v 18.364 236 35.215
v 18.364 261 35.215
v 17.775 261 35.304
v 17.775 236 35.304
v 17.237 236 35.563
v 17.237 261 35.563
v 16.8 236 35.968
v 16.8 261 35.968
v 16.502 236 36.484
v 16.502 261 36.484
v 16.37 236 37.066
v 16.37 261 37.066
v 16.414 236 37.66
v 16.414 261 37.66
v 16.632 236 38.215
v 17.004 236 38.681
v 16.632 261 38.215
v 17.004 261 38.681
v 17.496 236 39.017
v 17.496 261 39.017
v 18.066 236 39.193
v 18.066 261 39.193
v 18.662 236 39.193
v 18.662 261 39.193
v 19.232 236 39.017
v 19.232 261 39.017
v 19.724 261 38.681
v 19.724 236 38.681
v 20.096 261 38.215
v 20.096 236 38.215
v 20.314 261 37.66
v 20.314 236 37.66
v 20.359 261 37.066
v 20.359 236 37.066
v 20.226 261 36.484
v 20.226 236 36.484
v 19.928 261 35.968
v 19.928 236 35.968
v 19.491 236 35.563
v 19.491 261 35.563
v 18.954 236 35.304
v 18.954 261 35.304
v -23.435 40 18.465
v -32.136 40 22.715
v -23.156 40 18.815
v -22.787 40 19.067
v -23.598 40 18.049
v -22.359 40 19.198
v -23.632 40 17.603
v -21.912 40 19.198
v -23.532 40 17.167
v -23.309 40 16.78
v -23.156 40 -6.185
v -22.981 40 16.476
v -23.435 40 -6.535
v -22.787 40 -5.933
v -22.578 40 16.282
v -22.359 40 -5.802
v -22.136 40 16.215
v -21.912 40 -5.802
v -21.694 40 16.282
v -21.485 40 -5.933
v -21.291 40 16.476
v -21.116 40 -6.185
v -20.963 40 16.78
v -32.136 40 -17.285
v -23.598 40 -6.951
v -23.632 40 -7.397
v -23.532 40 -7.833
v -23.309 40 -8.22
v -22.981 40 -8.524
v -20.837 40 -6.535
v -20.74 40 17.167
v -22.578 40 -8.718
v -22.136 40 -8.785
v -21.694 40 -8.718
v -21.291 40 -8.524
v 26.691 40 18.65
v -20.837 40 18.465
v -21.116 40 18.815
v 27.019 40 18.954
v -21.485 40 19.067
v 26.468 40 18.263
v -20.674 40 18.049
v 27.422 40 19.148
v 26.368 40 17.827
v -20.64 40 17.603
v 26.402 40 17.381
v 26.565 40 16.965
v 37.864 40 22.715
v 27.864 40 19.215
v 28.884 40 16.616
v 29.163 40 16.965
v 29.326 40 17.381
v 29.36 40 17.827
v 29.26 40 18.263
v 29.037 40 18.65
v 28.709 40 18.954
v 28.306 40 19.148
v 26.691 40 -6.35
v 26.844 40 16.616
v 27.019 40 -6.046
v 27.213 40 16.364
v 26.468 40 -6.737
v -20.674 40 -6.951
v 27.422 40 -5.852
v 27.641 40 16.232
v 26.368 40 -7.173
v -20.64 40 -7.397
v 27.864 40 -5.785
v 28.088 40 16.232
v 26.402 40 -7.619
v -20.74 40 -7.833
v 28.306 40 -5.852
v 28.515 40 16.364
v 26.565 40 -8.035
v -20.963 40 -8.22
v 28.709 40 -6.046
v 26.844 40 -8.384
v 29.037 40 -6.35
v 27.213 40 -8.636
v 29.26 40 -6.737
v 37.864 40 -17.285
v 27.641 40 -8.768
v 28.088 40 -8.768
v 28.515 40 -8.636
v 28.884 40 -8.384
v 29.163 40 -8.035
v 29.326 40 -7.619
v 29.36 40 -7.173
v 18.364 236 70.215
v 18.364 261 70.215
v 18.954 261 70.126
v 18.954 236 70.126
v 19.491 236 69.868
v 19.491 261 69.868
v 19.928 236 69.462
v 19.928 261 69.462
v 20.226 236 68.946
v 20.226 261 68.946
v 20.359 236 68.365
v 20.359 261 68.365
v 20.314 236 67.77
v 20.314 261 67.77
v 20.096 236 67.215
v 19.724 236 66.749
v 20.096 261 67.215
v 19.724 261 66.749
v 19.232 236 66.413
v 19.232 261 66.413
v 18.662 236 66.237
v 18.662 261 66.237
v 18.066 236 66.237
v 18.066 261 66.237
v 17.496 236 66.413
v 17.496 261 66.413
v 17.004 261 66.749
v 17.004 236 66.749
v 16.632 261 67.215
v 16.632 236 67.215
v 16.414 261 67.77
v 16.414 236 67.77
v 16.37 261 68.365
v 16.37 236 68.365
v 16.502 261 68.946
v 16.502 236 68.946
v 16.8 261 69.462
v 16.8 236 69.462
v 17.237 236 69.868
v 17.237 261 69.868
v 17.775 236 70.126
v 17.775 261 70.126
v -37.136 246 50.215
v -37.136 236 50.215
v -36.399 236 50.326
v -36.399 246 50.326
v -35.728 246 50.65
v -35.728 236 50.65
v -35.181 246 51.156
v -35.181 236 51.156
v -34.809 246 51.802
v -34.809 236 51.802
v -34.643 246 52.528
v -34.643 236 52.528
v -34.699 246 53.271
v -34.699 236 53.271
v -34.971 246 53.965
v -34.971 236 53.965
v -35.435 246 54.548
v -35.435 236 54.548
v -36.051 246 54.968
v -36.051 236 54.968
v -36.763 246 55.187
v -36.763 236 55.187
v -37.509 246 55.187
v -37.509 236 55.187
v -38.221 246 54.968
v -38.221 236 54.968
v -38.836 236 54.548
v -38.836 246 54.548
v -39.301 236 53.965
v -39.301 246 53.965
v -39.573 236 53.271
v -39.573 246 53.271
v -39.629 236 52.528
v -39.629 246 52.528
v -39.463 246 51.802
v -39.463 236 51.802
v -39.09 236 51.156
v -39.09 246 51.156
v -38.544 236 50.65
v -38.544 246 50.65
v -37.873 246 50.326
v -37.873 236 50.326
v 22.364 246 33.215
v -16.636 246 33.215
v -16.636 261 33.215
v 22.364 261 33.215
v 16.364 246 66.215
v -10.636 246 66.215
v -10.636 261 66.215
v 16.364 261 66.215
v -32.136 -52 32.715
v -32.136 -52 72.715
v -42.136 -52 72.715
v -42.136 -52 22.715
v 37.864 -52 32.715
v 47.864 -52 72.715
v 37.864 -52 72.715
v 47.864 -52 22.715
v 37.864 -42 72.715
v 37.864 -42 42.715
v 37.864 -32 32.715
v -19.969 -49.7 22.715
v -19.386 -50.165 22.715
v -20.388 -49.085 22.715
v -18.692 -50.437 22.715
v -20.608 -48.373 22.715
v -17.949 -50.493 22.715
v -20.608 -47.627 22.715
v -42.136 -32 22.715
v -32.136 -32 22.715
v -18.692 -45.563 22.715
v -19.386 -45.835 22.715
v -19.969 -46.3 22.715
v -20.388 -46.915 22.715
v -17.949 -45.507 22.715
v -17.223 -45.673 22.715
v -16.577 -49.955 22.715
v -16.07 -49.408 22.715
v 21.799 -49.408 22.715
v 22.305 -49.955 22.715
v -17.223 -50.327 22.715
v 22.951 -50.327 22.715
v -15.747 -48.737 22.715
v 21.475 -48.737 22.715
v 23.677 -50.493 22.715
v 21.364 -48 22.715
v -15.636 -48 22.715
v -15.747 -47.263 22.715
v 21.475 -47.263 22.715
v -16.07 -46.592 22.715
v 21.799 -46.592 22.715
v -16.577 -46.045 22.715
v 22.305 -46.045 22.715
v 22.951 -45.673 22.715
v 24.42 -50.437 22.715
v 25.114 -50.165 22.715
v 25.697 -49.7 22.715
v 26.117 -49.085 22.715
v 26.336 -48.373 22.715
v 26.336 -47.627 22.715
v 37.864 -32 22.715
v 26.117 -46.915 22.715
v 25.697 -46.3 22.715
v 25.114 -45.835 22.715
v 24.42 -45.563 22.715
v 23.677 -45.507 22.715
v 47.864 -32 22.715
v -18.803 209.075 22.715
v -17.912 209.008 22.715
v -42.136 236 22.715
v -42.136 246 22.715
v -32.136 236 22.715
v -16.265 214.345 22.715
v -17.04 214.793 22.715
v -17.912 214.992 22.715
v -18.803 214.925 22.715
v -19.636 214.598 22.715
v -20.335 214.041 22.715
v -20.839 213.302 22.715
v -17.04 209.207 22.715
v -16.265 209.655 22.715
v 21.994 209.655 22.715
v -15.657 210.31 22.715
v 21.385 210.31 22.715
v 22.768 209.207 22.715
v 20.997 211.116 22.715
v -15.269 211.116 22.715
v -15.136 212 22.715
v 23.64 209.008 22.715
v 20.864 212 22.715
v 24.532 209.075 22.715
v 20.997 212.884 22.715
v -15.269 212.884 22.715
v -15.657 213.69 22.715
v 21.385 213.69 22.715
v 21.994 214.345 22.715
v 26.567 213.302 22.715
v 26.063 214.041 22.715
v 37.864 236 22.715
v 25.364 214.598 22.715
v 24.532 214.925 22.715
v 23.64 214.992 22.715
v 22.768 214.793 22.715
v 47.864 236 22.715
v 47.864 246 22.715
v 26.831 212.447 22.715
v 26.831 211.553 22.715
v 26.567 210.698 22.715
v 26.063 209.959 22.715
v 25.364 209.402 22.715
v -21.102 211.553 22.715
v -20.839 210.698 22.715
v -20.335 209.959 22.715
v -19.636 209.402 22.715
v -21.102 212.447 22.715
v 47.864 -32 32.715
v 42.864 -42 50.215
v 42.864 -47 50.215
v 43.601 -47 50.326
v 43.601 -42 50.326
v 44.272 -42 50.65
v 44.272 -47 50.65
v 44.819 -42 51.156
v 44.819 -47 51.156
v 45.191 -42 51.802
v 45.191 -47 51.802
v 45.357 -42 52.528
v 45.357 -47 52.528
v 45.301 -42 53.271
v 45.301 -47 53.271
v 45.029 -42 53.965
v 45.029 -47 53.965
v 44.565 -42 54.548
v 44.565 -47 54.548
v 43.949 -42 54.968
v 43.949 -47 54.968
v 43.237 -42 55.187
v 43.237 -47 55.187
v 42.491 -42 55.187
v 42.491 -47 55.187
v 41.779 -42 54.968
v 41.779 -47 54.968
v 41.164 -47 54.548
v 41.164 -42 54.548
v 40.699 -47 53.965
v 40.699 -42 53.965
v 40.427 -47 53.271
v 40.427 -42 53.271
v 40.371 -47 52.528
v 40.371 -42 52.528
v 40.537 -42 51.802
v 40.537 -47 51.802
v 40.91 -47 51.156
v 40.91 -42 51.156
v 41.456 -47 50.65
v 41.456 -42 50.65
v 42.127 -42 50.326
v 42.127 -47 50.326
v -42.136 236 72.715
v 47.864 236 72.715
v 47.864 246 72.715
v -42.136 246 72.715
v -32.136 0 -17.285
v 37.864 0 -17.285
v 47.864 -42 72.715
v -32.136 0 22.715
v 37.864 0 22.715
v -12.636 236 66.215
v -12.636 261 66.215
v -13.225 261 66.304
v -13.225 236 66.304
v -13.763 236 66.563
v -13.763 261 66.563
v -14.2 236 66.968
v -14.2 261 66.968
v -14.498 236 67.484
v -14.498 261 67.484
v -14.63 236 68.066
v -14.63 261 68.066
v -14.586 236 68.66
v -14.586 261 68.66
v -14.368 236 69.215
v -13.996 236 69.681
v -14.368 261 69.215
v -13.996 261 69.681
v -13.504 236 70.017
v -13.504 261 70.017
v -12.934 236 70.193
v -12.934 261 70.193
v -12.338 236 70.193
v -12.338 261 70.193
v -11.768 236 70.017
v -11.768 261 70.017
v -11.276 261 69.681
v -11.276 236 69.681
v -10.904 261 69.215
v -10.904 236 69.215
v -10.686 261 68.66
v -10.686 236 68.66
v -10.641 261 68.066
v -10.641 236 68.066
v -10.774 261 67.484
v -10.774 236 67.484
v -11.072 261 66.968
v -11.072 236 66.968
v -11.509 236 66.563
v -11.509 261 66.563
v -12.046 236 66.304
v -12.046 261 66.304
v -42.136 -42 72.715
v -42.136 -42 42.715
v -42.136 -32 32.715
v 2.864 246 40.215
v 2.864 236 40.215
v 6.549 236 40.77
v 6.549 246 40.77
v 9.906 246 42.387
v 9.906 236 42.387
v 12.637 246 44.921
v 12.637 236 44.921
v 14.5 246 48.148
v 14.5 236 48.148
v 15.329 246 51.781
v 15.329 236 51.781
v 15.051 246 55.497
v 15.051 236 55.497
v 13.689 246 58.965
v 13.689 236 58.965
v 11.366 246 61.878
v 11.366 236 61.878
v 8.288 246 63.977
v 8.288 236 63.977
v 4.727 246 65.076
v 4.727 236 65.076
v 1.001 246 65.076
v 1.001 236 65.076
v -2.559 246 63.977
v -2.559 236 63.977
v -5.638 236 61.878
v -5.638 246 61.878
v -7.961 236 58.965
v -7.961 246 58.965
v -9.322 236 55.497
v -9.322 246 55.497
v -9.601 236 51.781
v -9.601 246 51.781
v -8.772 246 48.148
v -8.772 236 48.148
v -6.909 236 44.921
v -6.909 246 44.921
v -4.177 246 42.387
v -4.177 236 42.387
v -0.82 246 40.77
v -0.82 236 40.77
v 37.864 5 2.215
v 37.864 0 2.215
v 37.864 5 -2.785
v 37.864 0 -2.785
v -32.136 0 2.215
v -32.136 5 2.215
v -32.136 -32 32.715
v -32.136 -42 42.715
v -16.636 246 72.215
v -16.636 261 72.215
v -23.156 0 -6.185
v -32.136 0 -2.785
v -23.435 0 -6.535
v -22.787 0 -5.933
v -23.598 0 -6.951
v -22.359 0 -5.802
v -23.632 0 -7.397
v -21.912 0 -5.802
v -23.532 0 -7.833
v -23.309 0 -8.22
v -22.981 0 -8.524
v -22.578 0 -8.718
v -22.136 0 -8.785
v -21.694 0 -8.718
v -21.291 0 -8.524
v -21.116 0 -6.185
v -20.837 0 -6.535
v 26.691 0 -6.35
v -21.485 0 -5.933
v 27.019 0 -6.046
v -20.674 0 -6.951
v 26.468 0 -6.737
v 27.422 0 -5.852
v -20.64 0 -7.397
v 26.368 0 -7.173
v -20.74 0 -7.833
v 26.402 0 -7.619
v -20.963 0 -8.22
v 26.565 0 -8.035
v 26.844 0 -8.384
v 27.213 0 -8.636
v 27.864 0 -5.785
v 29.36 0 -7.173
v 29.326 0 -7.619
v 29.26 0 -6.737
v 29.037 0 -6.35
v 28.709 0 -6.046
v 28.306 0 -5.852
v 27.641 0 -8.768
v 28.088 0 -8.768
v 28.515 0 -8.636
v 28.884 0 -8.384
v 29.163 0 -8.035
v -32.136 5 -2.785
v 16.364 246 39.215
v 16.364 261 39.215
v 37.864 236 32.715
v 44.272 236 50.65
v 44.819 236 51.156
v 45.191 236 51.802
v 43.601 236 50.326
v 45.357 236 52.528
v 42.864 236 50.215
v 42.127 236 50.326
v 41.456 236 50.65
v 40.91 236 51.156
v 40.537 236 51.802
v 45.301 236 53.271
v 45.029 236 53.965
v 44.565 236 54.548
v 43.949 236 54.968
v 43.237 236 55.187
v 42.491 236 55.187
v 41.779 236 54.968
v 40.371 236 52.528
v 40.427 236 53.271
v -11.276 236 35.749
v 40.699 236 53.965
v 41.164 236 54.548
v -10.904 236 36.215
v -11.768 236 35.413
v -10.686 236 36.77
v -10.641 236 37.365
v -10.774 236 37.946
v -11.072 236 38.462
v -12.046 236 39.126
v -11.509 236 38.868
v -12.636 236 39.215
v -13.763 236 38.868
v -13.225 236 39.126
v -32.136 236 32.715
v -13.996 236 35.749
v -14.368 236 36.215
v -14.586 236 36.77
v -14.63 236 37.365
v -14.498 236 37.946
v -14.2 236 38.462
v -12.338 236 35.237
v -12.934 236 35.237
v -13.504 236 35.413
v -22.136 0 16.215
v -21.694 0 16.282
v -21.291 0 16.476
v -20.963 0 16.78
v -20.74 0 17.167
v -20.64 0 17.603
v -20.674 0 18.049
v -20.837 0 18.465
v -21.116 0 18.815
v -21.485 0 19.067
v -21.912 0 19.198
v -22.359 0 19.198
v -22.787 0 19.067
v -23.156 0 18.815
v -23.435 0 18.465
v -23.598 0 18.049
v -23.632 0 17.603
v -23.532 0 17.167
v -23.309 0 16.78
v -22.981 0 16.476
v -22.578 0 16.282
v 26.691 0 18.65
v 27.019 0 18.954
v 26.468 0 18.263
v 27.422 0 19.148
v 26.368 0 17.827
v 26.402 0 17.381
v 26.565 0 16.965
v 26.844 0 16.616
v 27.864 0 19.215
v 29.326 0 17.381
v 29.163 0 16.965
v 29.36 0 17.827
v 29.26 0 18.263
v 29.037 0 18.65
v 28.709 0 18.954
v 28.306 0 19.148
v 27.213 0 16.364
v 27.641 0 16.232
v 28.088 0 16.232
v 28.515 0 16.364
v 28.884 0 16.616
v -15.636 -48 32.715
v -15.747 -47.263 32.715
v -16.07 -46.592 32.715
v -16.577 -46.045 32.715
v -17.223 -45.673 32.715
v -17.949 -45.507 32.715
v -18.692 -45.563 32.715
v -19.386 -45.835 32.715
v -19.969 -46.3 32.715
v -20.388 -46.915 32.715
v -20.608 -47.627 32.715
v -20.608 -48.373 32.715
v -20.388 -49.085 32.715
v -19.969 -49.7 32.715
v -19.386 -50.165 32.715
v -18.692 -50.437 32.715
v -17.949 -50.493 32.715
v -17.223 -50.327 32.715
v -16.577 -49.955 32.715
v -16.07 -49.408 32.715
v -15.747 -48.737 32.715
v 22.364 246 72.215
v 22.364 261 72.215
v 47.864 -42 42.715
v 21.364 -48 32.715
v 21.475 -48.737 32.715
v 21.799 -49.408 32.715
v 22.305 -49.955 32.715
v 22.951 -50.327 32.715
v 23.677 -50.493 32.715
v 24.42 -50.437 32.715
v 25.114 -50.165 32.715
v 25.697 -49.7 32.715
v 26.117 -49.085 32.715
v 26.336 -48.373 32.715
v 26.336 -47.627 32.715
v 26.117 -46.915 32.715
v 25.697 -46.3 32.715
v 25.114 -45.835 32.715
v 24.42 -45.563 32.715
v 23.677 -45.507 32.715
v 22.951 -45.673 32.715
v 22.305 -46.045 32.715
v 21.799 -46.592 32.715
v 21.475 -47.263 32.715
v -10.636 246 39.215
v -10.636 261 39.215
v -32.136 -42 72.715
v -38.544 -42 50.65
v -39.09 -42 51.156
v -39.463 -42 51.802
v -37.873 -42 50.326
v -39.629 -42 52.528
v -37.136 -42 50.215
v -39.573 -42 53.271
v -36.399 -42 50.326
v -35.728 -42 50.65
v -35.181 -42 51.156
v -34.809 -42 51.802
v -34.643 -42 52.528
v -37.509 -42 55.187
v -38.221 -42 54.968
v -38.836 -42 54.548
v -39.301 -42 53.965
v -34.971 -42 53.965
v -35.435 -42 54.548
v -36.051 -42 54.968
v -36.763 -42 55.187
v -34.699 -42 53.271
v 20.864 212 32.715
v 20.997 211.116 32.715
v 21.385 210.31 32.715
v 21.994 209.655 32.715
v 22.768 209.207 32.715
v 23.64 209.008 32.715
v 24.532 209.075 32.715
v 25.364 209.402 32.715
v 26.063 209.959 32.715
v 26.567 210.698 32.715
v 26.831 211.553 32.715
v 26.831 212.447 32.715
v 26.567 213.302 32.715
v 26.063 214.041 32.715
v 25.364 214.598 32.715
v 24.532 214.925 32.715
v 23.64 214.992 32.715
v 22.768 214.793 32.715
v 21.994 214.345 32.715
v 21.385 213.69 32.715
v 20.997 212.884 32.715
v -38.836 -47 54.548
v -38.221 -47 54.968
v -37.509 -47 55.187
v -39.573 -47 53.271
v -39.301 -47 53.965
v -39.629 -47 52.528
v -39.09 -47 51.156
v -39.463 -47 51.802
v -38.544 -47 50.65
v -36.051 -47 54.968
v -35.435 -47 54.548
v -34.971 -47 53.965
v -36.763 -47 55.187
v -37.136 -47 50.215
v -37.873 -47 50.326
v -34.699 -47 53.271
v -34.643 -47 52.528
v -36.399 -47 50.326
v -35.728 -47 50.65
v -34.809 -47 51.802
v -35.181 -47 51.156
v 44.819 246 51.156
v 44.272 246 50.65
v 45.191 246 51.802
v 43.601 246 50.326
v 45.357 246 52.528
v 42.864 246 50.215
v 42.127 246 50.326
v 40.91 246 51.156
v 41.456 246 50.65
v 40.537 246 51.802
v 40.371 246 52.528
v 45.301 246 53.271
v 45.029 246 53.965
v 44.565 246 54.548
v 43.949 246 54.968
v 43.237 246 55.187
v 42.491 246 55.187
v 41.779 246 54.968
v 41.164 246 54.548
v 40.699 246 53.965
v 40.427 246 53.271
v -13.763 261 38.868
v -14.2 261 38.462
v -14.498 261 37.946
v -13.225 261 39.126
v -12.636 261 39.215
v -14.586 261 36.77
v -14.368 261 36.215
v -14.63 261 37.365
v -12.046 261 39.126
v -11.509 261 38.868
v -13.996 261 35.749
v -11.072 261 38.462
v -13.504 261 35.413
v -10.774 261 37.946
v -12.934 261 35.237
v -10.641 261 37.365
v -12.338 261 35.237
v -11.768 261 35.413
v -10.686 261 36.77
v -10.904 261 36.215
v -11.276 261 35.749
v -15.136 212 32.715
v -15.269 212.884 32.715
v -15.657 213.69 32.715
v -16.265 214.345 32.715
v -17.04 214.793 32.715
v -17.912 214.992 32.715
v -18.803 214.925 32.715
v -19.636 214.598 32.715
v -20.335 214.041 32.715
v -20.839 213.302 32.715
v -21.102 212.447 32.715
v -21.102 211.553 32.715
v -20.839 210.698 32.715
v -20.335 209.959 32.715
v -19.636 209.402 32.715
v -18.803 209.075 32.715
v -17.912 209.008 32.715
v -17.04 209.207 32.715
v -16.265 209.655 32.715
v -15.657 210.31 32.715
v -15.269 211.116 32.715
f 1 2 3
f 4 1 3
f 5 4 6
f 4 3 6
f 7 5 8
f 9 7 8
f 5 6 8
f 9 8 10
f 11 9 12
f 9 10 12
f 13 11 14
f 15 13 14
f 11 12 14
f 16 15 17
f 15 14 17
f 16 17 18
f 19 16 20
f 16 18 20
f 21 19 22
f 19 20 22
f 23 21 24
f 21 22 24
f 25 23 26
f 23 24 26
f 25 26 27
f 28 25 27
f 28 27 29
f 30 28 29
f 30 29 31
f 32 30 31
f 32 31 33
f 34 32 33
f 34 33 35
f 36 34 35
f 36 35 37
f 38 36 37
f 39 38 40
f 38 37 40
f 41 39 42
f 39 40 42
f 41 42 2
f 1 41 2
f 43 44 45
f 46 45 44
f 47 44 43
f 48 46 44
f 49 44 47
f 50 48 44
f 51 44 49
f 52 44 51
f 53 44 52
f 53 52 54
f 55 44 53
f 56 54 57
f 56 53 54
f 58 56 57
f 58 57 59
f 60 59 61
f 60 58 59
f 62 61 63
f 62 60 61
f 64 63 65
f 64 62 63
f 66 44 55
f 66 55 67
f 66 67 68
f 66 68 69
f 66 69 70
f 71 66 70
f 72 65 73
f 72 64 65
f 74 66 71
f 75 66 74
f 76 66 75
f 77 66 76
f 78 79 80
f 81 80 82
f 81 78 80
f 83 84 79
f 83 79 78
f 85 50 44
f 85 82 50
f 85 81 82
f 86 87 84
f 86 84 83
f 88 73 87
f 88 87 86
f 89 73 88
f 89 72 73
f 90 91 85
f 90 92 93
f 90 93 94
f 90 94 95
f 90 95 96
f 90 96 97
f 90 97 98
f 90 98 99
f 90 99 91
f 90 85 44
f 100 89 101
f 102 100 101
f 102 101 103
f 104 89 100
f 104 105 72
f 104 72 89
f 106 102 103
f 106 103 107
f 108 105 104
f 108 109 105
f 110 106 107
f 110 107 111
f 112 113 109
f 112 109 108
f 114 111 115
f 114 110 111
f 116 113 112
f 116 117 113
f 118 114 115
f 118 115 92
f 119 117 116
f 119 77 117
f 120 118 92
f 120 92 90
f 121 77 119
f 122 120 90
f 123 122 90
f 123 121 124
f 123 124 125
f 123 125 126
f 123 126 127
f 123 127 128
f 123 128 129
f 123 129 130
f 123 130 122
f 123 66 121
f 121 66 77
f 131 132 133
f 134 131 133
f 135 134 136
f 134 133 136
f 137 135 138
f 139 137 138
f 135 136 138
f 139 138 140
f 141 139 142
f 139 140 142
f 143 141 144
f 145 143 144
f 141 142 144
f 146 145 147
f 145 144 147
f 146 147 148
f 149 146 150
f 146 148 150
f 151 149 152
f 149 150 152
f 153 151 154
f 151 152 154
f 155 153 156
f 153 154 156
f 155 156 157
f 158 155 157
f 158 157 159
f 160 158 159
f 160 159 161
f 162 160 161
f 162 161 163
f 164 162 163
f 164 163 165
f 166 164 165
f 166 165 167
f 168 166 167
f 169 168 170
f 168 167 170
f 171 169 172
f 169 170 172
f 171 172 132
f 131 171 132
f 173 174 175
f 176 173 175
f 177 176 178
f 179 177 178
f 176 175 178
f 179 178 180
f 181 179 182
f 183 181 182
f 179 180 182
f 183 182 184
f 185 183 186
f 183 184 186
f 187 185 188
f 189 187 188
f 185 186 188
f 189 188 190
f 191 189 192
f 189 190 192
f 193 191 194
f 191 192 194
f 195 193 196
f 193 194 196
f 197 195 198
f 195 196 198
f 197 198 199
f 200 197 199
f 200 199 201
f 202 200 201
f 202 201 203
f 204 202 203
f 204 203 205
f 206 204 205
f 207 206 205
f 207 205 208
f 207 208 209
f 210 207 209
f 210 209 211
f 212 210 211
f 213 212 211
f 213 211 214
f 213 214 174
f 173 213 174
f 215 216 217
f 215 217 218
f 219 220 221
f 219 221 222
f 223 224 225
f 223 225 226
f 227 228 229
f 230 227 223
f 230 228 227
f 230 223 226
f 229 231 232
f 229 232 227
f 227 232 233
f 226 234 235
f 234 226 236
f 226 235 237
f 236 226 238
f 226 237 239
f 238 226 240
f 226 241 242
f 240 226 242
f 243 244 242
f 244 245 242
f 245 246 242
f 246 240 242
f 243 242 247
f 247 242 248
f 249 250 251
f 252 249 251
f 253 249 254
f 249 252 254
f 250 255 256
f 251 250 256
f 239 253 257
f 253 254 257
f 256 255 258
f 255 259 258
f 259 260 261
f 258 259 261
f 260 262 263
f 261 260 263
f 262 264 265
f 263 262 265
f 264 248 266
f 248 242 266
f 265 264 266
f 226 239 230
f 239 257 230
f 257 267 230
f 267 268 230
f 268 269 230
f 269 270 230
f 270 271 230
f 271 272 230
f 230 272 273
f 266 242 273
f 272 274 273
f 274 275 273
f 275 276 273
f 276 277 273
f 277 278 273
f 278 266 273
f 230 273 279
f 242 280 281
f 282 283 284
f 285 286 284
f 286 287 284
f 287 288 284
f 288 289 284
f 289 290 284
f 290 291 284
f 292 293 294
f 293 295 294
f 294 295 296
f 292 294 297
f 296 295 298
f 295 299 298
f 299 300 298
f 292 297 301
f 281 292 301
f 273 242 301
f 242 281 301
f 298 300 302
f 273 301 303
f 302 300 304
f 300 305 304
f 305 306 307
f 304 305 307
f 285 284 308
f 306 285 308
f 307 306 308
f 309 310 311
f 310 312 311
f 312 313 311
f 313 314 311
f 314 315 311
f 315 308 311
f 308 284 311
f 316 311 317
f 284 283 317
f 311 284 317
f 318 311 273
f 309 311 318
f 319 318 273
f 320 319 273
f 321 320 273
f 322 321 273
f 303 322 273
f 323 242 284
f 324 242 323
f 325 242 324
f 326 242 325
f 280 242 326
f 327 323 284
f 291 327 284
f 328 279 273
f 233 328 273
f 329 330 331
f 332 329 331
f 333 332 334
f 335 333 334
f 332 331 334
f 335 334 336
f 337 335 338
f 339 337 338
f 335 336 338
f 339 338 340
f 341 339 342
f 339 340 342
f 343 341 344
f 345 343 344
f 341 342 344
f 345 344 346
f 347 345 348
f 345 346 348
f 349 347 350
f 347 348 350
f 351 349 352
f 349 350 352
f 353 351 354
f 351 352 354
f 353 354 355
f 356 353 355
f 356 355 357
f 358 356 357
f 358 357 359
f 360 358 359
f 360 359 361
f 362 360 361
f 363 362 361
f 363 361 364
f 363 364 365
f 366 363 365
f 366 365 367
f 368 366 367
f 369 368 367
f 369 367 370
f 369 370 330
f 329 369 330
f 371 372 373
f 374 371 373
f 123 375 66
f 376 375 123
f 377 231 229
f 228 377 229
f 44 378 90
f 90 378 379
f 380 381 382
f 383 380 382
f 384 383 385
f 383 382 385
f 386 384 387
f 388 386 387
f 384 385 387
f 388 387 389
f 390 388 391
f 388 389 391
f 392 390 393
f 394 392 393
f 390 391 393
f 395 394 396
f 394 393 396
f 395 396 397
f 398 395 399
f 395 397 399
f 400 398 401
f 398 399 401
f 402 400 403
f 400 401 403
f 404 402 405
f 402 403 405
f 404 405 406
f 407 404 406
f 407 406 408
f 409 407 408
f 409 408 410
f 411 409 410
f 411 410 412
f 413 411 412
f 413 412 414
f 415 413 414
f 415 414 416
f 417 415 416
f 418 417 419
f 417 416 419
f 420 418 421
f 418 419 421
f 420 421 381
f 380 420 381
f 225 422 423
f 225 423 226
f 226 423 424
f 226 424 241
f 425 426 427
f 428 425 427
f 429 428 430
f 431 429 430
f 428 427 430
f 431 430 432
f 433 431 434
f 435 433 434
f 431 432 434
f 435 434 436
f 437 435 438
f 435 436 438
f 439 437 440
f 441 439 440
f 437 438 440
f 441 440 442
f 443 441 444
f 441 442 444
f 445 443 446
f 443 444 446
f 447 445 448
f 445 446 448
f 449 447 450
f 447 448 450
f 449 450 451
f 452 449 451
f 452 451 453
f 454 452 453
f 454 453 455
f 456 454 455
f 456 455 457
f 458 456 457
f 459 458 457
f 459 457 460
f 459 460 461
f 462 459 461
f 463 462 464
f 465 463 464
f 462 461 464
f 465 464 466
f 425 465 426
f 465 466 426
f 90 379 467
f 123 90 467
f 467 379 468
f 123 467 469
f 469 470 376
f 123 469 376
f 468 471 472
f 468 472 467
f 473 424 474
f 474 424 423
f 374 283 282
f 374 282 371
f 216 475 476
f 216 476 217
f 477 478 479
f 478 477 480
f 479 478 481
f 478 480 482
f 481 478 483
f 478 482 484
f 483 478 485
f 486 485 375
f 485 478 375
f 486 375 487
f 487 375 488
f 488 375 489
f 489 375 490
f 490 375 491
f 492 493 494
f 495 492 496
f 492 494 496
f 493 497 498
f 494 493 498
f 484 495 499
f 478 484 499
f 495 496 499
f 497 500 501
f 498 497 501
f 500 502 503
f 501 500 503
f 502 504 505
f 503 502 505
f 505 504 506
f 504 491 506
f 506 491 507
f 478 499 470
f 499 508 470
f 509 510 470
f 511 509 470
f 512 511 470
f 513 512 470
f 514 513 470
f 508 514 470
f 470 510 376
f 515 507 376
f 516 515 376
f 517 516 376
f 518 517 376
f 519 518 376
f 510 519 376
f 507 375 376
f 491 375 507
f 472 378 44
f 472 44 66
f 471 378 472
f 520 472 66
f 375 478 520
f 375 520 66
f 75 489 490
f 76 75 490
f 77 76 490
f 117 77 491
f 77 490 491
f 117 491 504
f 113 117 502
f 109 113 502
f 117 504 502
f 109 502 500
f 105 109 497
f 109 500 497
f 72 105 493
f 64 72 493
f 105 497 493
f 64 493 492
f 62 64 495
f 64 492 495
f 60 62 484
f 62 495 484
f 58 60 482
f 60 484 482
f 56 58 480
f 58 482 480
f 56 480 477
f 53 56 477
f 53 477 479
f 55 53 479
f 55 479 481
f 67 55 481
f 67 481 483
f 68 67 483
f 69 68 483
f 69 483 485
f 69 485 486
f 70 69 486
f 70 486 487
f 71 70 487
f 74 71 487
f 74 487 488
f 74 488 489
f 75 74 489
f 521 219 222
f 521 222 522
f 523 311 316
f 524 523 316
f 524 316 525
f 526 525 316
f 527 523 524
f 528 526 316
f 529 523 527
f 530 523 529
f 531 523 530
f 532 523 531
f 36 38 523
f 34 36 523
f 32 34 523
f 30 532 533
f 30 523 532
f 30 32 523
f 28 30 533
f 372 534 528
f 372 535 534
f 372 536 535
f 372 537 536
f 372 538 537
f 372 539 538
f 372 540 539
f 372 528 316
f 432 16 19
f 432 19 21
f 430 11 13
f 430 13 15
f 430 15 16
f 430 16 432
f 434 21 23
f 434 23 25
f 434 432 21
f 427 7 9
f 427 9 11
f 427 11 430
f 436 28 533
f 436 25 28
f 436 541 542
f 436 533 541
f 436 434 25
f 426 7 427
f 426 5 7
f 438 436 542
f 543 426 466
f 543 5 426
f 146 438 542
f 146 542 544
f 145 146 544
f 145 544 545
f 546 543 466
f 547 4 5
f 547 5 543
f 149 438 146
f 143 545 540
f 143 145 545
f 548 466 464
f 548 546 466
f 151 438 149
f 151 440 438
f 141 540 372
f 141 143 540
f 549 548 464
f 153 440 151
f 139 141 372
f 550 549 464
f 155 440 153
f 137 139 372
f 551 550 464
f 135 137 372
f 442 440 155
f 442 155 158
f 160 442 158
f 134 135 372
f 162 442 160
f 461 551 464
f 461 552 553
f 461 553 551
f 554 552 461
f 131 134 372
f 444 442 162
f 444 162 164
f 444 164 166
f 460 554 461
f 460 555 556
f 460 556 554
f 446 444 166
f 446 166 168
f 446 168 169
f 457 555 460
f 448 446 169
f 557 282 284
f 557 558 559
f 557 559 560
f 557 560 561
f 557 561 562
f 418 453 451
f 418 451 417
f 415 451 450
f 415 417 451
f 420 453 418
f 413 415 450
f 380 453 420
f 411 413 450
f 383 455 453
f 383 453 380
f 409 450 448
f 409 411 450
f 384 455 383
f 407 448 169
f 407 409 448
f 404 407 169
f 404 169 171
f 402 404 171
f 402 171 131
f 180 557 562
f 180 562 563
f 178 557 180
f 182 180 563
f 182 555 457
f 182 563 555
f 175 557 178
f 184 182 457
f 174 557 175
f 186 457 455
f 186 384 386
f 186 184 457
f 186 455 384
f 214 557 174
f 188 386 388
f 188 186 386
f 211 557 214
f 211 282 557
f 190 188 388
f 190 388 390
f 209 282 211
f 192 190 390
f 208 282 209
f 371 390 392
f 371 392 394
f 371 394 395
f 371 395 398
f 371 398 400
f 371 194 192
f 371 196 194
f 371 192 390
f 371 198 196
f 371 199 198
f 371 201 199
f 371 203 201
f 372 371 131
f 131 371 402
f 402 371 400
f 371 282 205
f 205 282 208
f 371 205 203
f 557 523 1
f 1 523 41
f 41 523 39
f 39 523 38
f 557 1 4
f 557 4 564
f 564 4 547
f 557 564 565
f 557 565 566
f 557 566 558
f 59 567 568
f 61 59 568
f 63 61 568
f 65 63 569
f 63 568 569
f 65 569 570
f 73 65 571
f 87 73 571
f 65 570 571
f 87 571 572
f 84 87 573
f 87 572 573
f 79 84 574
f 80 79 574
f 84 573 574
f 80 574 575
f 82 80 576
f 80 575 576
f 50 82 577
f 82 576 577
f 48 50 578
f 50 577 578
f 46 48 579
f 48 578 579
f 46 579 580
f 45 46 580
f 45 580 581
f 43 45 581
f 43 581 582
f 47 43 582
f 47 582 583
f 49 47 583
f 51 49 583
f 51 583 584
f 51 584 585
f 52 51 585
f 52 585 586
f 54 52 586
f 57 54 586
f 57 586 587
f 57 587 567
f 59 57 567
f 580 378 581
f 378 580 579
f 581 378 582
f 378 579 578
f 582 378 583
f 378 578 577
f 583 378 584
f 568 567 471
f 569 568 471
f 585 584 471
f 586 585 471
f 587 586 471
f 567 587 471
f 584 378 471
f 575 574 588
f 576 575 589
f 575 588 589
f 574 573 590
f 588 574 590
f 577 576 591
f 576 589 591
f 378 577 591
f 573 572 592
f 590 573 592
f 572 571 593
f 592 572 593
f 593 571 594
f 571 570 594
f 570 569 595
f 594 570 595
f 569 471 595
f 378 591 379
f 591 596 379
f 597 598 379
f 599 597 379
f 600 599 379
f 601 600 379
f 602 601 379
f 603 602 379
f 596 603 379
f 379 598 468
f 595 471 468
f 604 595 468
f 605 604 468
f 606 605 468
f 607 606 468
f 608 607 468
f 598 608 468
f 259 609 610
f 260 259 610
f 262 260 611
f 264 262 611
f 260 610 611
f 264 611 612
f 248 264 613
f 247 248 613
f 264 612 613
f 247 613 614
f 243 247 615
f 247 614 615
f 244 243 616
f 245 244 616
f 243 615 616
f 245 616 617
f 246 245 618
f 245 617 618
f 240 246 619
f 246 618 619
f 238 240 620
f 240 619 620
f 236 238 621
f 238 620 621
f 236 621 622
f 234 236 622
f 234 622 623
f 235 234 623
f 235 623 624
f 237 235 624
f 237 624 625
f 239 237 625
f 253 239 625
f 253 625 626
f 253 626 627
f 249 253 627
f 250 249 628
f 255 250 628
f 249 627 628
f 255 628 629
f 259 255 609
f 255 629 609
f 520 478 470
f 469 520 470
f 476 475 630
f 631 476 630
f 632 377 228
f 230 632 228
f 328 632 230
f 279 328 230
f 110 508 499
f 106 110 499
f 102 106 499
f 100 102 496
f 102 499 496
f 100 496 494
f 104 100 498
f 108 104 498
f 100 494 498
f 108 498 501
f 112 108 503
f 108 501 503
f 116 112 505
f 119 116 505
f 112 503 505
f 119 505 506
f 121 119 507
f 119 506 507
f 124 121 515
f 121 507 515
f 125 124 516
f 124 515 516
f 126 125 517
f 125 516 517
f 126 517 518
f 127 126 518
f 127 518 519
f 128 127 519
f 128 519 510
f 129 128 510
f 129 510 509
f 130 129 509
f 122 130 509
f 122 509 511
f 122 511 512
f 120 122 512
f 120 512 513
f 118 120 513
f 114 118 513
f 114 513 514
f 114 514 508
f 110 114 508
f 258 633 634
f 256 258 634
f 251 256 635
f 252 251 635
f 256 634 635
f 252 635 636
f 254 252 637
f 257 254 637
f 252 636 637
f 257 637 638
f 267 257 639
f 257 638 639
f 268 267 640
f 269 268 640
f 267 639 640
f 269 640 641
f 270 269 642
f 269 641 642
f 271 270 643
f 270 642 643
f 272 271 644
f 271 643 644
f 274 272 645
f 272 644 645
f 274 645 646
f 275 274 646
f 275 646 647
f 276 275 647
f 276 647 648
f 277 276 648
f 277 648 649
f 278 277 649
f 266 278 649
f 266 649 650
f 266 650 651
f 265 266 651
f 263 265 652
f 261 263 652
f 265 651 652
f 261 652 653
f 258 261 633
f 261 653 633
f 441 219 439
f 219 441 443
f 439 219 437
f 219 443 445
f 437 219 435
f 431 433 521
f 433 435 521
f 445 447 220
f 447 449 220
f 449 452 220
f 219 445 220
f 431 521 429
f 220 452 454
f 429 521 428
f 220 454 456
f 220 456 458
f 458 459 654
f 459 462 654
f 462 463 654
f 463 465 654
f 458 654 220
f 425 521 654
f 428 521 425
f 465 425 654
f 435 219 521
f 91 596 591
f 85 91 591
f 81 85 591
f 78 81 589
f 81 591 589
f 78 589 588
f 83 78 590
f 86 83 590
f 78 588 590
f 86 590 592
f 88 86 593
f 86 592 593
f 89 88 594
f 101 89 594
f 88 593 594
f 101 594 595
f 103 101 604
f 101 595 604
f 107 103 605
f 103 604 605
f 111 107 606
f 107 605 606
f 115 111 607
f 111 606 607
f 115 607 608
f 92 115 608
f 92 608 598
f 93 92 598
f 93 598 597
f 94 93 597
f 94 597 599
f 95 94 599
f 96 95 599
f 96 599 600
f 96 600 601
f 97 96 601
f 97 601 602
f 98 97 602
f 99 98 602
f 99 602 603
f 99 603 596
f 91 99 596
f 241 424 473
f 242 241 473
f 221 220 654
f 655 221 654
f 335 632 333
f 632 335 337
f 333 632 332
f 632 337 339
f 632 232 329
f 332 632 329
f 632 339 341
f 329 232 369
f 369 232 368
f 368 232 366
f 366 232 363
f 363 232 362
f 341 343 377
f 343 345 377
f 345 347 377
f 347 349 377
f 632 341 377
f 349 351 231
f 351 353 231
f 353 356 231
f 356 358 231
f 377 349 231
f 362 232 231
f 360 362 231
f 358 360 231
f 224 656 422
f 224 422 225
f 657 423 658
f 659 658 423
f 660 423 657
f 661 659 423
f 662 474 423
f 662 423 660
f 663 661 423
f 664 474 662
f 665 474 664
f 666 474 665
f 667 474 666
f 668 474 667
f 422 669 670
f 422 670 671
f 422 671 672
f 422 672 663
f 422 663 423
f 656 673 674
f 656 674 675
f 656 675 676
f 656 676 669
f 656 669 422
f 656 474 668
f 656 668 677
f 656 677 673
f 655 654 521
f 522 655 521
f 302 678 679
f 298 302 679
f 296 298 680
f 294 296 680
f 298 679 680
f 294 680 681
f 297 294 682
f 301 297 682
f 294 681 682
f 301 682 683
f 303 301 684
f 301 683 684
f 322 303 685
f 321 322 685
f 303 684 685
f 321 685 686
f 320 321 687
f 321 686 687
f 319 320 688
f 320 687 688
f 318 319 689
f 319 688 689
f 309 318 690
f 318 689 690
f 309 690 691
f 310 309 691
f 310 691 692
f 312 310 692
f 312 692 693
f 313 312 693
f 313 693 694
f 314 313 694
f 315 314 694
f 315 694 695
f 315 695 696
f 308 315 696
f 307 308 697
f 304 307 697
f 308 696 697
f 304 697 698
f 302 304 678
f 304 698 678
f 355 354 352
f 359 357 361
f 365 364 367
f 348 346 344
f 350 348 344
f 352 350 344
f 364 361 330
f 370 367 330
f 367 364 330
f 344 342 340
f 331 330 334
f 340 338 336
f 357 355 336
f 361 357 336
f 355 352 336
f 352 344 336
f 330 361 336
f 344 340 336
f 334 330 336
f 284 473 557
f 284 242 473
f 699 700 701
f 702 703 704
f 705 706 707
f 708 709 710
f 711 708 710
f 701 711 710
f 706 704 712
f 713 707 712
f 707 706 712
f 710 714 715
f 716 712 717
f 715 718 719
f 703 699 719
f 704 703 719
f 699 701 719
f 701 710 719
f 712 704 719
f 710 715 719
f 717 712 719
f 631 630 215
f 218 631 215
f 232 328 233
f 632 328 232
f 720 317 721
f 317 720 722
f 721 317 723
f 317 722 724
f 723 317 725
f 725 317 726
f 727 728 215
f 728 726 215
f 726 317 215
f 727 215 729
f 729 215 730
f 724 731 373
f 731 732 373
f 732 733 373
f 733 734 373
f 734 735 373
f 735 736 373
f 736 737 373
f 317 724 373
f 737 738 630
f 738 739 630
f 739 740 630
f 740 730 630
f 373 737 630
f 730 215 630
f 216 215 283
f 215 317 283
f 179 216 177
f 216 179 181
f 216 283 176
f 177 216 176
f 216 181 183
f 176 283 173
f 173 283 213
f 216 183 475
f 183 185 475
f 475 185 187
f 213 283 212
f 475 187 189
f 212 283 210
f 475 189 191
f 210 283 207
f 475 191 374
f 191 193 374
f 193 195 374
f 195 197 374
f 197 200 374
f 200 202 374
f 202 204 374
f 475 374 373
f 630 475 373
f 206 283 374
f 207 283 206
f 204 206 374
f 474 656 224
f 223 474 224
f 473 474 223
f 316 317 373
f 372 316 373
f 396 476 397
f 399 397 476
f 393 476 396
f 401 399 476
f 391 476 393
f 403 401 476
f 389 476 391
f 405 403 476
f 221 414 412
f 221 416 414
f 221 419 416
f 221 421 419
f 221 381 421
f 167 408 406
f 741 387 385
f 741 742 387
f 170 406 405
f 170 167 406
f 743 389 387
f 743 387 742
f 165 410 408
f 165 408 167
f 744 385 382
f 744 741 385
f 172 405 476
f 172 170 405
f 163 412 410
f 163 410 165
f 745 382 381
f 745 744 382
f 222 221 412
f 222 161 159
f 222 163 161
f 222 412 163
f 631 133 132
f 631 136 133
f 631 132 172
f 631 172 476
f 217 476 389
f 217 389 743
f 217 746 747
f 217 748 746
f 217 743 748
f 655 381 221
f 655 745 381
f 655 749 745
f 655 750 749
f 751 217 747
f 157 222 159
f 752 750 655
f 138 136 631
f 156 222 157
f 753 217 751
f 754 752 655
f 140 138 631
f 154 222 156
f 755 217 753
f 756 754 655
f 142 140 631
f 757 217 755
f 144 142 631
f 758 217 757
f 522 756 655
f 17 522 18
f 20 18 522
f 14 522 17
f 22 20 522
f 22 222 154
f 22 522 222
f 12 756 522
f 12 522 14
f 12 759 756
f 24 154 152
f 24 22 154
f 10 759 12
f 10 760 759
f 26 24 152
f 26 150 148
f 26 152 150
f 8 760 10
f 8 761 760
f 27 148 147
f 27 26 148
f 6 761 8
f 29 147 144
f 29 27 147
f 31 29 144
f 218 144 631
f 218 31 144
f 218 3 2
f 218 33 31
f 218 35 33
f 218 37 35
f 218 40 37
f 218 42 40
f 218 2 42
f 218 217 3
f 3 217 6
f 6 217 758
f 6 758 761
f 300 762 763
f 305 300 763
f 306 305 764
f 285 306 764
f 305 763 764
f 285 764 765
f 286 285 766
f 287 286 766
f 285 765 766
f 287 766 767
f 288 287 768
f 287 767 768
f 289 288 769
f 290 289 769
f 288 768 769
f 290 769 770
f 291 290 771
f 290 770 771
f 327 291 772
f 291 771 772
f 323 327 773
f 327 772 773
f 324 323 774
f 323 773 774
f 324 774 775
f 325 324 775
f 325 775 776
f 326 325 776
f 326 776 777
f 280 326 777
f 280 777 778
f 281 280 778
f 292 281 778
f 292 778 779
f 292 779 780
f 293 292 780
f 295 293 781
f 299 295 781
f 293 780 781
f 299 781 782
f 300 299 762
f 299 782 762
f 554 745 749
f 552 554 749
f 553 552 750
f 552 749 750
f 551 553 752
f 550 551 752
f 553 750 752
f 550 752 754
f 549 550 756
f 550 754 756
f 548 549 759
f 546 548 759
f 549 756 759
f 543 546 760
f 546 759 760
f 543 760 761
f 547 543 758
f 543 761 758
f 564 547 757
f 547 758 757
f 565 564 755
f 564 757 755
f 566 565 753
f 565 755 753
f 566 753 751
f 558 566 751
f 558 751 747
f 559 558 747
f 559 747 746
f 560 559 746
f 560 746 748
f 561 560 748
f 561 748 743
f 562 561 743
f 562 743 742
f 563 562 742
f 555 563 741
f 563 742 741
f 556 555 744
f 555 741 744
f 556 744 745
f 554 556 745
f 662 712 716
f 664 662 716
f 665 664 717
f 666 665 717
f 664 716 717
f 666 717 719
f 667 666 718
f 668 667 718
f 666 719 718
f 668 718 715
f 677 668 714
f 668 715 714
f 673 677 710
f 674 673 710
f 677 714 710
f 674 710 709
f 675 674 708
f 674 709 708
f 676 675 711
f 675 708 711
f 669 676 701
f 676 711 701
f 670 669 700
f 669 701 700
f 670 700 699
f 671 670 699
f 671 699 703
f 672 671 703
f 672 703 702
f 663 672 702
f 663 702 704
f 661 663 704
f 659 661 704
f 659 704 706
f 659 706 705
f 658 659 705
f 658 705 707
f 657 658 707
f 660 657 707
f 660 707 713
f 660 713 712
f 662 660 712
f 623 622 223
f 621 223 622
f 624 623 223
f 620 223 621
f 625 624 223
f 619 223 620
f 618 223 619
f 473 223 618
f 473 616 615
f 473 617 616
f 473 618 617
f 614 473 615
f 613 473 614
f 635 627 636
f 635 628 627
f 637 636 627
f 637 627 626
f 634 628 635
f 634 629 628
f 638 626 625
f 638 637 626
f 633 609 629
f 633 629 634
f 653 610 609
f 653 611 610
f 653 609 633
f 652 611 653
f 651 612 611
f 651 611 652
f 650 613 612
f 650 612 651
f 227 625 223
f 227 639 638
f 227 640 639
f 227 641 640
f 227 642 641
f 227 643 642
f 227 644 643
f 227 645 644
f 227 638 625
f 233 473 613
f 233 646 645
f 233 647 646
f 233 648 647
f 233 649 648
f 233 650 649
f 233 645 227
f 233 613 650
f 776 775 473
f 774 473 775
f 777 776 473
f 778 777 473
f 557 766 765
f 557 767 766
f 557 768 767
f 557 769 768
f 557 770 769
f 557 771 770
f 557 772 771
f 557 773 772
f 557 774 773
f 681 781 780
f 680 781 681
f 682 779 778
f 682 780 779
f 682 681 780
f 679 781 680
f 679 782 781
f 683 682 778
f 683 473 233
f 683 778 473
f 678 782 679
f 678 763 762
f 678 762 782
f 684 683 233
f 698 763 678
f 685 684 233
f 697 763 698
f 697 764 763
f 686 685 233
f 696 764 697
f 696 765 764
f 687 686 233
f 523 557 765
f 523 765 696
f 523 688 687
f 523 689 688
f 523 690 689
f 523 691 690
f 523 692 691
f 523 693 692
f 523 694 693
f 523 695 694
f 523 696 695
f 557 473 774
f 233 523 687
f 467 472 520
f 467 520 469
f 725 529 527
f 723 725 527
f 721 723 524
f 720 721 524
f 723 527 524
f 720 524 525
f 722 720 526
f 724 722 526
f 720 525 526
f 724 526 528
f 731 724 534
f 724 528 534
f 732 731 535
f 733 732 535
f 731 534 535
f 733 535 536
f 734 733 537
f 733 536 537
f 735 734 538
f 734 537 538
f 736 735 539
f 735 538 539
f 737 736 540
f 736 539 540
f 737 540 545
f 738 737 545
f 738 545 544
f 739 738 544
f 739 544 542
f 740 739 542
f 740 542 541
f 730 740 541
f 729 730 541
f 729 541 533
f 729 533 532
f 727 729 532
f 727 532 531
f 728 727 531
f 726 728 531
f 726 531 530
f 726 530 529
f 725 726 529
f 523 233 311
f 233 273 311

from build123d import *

# Parameters (mm, degrees)
SKETCH_1_W               = 70
SKETCH_1_H               = 40
EXTRUDE_1_DEPTH          = 40
SKETCH_2_R               = 1.5
CUT_EXTRUDE_1_DEPTH      = 60.579081363
EXTRUDE_2_DEPTH          = 52
EXTRUDE_2_DEPTH_BACK     = 236
SKETCH_4_W               = 70
SKETCH_4_H               = 10
SKETCH_5_R               = 2.5
CUT_EXTRUDE_2_DEPTH      = 10
SKETCH_6_R               = 3
CUT_EXTRUDE_3_DEPTH      = 10
SKETCH_7_W               = 70
SKETCH_7_H               = 10
EXTRUDE_3_DEPTH          = 50
SKETCH_8_R               = 12.5
CUT_EXTRUDE_4_DEPTH      = 10
SKETCH_12_W              = 39
SKETCH_12_H              = 39
SKETCH_12_W_2            = 27
SKETCH_12_H_2            = 27
EXTRUDE_2_2_DEPTH        = 15
SKETCH_14_R              = 2
CUT_EXTRUDE_5_DEPTH      = 25
SKETCH_15_W              = 70
SKETCH_15_H              = 5
CUT_EXTRUDE_6_DEPTH      = 5
SKETCH_16_W              = 50
SKETCH_16_H              = 10
EXTRUDE_5_DEPTH          = 10
MIRROR_2_COPY_1_SKETCH_W = 50
MIRROR_2_COPY_1_SKETCH_H = 10
MIRROR_2_COPY_1_DEPTH    = 10
SKETCH_17_R              = 2.5
CUT_EXTRUDE_7_DEPTH      = 325.880687163
SKETCH_18_R              = 2.5
EXTRUDE_6_DEPTH          = 5
SKETCH_21_W              = 10
SKETCH_21_H              = 10
EXTRUDE_8_DEPTH          = 10
EXTRUDE_9_DEPTH          = 10
EXTRUDE_10_DEPTH         = 10


with BuildPart() as part:
    # 草图1 → 凸台-拉伸1 (new body)
    with BuildSketch(Plane(origin=(0, 0, 0), x_dir=(1, 0, 0), z_dir=(0, 1, 0))):
        with Locations((2.864103165, -2.71511892)):
            Rectangle(SKETCH_1_W, SKETCH_1_H)
    extrude(amount=EXTRUDE_1_DEPTH)

    # 草图2 → 切除-拉伸1 (cut, through all)
    with BuildSketch(Plane.XZ):
        with Locations(Location((-22.135896835, 17.71511892, 0), (0, 0, 270))):
            Circle(SKETCH_2_R)
        with Locations(Location((27.864103165, 17.71511892, 0), (0, 0, 90))):
            Circle(SKETCH_2_R)
        with Locations(Location((-22.135896835, -7.28488108, 0), (0, 0, 270))):
            Circle(SKETCH_2_R)
        with Locations(Location((27.864103165, -7.28488108, 0), (0, 0, 90))):
            Circle(SKETCH_2_R)
    extrude(amount=-CUT_EXTRUDE_1_DEPTH, mode=Mode.SUBTRACT)

    # 草图15 → 切除-拉伸6 (cut)
    with BuildSketch(Plane.XZ):
        with Locations((2.864103165, -0.28488108)):
            Rectangle(SKETCH_15_W, SKETCH_15_H)
    extrude(amount=-CUT_EXTRUDE_6_DEPTH, mode=Mode.SUBTRACT)


with BuildPart() as body_2:
    # 草图4 → Extrude 2 (new, two sides: drawn at the far end of the back side and taken through both)
    with BuildSketch(Plane.XZ.offset(-EXTRUDE_2_DEPTH_BACK)):
        with Locations((2.864103165, 27.71511892)):
            Rectangle(SKETCH_4_W, SKETCH_4_H)
    extrude(amount=EXTRUDE_2_DEPTH + EXTRUDE_2_DEPTH_BACK)

    # 草图5 → 切除-拉伸2 (cut)
    with BuildSketch(Plane.XY.offset(32.71511892)):
        with Locations((-18.135896835, -48)):
            Circle(SKETCH_5_R)
        with Locations(Location((23.864103165, -48, 0), (0, 0, 180))):
            Circle(SKETCH_5_R)
    extrude(amount=-CUT_EXTRUDE_2_DEPTH, mode=Mode.SUBTRACT)

    # 草图6 → 切除-拉伸3 (cut)
    with BuildSketch(Plane.XY.offset(32.71511892)):
        with Locations((-18.135896835, 212)):
            Circle(SKETCH_6_R)
        with Locations(Location((23.864103165, 212, 0), (0, 0, 180))):
            Circle(SKETCH_6_R)
    extrude(amount=-CUT_EXTRUDE_3_DEPTH, mode=Mode.SUBTRACT)

    # 草图7 → 凸台-拉伸3 (add)
    with BuildSketch(Plane(origin=(0, 0, 22.71511892), x_dir=(-1, 0, 0), z_dir=(0, 0, -1))):
        with Locations((-2.864103165, 241)):
            Rectangle(SKETCH_7_W, SKETCH_7_H)
    extrude(amount=-EXTRUDE_3_DEPTH)

    # 草图8 → 切除-拉伸4 (cut)
    with BuildSketch(Plane.XZ.offset(-236)):
        with Locations(Location((2.864103165, 52.71511892, 0), (0, 0, 270))):
            Circle(SKETCH_8_R)
    extrude(amount=-CUT_EXTRUDE_4_DEPTH, mode=Mode.SUBTRACT)

    # 草图12 → Extrude 2 2 (add)
    with BuildSketch(Plane(origin=(0, 246, 0), x_dir=(1, 0, 0), z_dir=(0, 1, 0))):
        with Locations((2.864103165, -52.71511892)):
            Rectangle(SKETCH_12_W, SKETCH_12_H)
        with Locations((2.864103165, -52.71511892)):
            Rectangle(SKETCH_12_W_2, SKETCH_12_H_2, mode=Mode.SUBTRACT)
    extrude(amount=EXTRUDE_2_2_DEPTH)

    # 草图14 → 切除-拉伸5 (cut)
    with BuildSketch(Plane(origin=(0, 261, 0), x_dir=(1, 0, 0), z_dir=(0, 1, 0))):
        with Locations(Location((-12.635896835, -37.21511892, 0), (0, 0, 270))):
            Circle(SKETCH_14_R)
        with Locations(Location((18.364103165, -37.21511892, 0), (0, 0, 90))):
            Circle(SKETCH_14_R)
        with Locations(Location((-12.635896835, -68.21511892, 0), (0, 0, 90))):
            Circle(SKETCH_14_R)
        with Locations(Location((18.364103165, -68.21511892, 0), (0, 0, 270))):
            Circle(SKETCH_14_R)
    extrude(amount=-CUT_EXTRUDE_5_DEPTH, mode=Mode.SUBTRACT)

    # 草图16 → 凸台-拉伸5 (add)
    with BuildSketch(Plane.ZY.offset(32.135896835)):
        with Locations((47.71511892, 241)):
            Rectangle(SKETCH_16_W, SKETCH_16_H)
    extrude_5 = extrude(amount=EXTRUDE_5_DEPTH)

    # 镜向1: 凸台-拉伸5 across plane
    add(extrude_5.mirror(Plane.ZX.offset(97)))

    # 镜向2: 凸台-拉伸5 across plane
    add(extrude_5.mirror(Plane.ZY.offset(-2.864103165)))

    # 镜向2 copy 1 sketch → 镜向2 copy 1 (add)
    with BuildSketch(Plane(origin=(37.864103165, 194, 0), x_dir=(0, 0, 1), z_dir=(1, 0, 0))):
        with Locations((47.71511892, 241)):
            Rectangle(MIRROR_2_COPY_1_SKETCH_W, MIRROR_2_COPY_1_SKETCH_H)
    extrude(amount=MIRROR_2_COPY_1_DEPTH)

    # 草图17 → 切除-拉伸7 (cut, through all)
    with BuildSketch(Plane.XZ.offset(52)):
        with Locations(Location((-37.135896835, 52.71511892, 0), (0, 0, 270))):
            Circle(SKETCH_17_R)
        with Locations(Location((42.864103165, 52.71511892, 0), (0, 0, 270))):
            Circle(SKETCH_17_R)
    extrude(amount=-CUT_EXTRUDE_7_DEPTH, mode=Mode.SUBTRACT)

    # 草图18 → 凸台-拉伸6 (add)
    with BuildSketch(Plane.XZ.offset(52)):
        with Locations(Location((-37.135896835, 52.71511892, 0), (0, 0, 270))):
            Circle(SKETCH_18_R)
        with Locations(Location((42.864103165, 52.71511892, 0), (0, 0, 270))):
            Circle(SKETCH_18_R)
    extrude(amount=-EXTRUDE_6_DEPTH)

    # 草图21 → 凸台-拉伸8 (add)
    with BuildSketch(Plane(origin=(0, 0, 22.71511892), x_dir=(-1, 0, 0), z_dir=(0, 0, -1))):
        with Locations((-42.864103165, -37)):
            Rectangle(SKETCH_21_W, SKETCH_21_H)
    extrude_8 = extrude(amount=-EXTRUDE_8_DEPTH)

    # 镜向3: 凸台-拉伸8 across plane
    add(extrude_8.mirror(Plane.ZY.offset(-2.864103165)))

    # 草图22 → 凸台-拉伸9 (add)
    with BuildSketch(Plane(origin=(47.864103165, 0, 0), x_dir=(0, 0, -1), z_dir=(1, 0, 0))):
        Polygon((-32.71511892, -32), (-42.71511892, -42), (-32.71511892, -42), align=None)
    extrude(amount=-EXTRUDE_9_DEPTH)

    # 草图23 → 凸台-拉伸10 (add)
    with BuildSketch(Plane.ZY.offset(42.135896835)):
        Polygon((32.71511892, -32), (42.71511892, -42), (32.71511892, -42), align=None)
    extrude(amount=-EXTRUDE_10_DEPTH)


solid = Compound([part.part, body_2.part])
